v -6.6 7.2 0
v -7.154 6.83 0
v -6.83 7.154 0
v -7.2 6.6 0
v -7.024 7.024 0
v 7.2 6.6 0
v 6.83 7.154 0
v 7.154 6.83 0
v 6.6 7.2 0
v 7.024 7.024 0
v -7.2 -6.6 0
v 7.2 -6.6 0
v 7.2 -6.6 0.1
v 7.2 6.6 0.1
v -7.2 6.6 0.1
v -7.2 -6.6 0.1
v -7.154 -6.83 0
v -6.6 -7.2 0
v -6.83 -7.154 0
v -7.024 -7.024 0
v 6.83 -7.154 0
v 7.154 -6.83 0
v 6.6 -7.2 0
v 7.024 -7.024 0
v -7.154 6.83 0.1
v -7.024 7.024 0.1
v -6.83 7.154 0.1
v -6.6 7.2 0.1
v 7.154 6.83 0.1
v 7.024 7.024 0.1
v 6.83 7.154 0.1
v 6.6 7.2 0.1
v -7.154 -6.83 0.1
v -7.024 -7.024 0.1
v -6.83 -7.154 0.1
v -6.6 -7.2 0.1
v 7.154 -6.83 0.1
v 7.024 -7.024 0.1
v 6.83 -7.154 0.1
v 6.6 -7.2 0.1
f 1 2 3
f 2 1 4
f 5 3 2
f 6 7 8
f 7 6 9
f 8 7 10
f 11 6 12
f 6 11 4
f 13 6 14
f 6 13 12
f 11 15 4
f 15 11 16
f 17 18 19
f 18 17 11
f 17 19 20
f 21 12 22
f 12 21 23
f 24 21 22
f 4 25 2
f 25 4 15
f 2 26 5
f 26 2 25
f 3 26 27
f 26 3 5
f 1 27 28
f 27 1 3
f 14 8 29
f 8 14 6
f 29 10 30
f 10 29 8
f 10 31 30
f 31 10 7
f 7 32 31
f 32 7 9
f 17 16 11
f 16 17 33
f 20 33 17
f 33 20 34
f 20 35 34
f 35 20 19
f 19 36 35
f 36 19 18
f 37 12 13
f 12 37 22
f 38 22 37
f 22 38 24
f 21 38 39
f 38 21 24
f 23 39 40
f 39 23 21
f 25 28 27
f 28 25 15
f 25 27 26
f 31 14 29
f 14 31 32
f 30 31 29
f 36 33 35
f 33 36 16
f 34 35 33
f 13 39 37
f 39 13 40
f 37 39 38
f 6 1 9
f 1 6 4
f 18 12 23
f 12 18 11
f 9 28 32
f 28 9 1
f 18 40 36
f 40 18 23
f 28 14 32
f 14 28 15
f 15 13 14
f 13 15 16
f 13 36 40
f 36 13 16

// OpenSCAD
// file: ../p/4-4edge.scad
use <../lib.scad>
$fa=1; $fs=0.2;
function ldraw_lib__4_4edge(realsolid=false) = [
// 0 Circle 1.0
// 0 Name: 4-4edge.dat
// 0 Author: James Jessiman
// 0 !LDRAW_ORG Primitive UPDATE 2017-01
// 0 !LICENSE Licensed under CC BY 2.0 and CC BY 4.0 : see CAreadme.txt
// 
// 0 BFC CERTIFY CCW
  [0,"BFC","CERTIFY"],
  [0,"BFC","CCW"],
// 
// 0 !HISTORY 1998-12-15 [PTadmin] Official Update 1998-10
// 0 !HISTORY 2005-12-28 [PTadmin] Official Update 2005-01
// 0 !HISTORY 2007-06-24 [PTadmin] Header formatted for Contributor Agreement
// 0 !HISTORY 2008-07-01 [PTadmin] Official Update 2008-01
// 0 !HISTORY 2017-01-15 [Steffen] BFCed
// 0 !HISTORY 2017-12-30 [PTadmin] Official Update 2017-01
// 
// 
// 2 24 1 0 0 0.9239 0 0.3827
  [2,24,1,0,0,0.9239,0,0.3827],
// 2 24 0.9239 0 0.3827 0.7071 0 0.7071
  [2,24,0.9239,0,0.3827,0.7071,0,0.7071],
// 2 24 0.7071 0 0.7071 0.3827 0 0.9239
  [2,24,0.7071,0,0.7071,0.3827,0,0.9239],
// 2 24 0.3827 0 0.9239 0 0 1
  [2,24,0.3827,0,0.9239,0,0,1],
// 2 24 0 0 1 -0.3827 0 0.9239
  [2,24,0,0,1,-0.3827,0,0.9239],
// 2 24 -0.3827 0 0.9239 -0.7071 0 0.7071
  [2,24,-0.3827,0,0.9239,-0.7071,0,0.7071],
// 2 24 -0.7071 0 0.7071 -0.9239 0 0.3827
  [2,24,-0.7071,0,0.7071,-0.9239,0,0.3827],
// 2 24 -0.9239 0 0.3827 -1 0 -0
  [2,24,-0.9239,0,0.3827,-1,0,-0],
// 2 24 -1 0 -0 -0.9239 0 -0.3827
  [2,24,-1,0,-0,-0.9239,0,-0.3827],
// 2 24 -0.9239 0 -0.3827 -0.7071 0 -0.7071
  [2,24,-0.9239,0,-0.3827,-0.7071,0,-0.7071],
// 2 24 -0.7071 0 -0.7071 -0.3827 0 -0.9239
  [2,24,-0.7071,0,-0.7071,-0.3827,0,-0.9239],
// 2 24 -0.3827 0 -0.9239 0 0 -1
  [2,24,-0.3827,0,-0.9239,0,0,-1],
// 2 24 0 0 -1 0.3827 0 -0.9239
  [2,24,0,0,-1,0.3827,0,-0.9239],
// 2 24 0.3827 0 -0.9239 0.7071 0 -0.7071
  [2,24,0.3827,0,-0.9239,0.7071,0,-0.7071],
// 2 24 0.7071 0 -0.7071 0.9239 0 -0.3827
  [2,24,0.7071,0,-0.7071,0.9239,0,-0.3827],
// 2 24 0.9239 0 -0.3827 1 0 0
  [2,24,0.9239,0,-0.3827,1,0,0],
];
module ldraw_lib__4_4edge(step=0, col=false, unit=2/5, alt=false, line=0.2, solid=!$preview)
    makepoly(ldraw_lib__4_4edge(solid), step=step, col=col, unit=unit, alt=alt, line=line, solid=solid);
ldraw_lib__4_4edge(line=0.2);
// file: ../p/4-4disc.scad
use <../lib.scad>
$fa=1; $fs=0.2;
function ldraw_lib__4_4disc(realsolid=false) = [
// 0 Disc 1.0
// 0 Name: 4-4disc.dat
// 0 Author: James Jessiman
// 0 !LDRAW_ORG Primitive UPDATE 2002-02
// 0 !LICENSE Licensed under CC BY 2.0 and CC BY 4.0 : see CAreadme.txt
// 
// 0 BFC CERTIFY CCW
  [0,"BFC","CERTIFY"],
  [0,"BFC","CCW"],
// 
// 0 !HISTORY 1998-12-15 [PTadmin] Official Update 1998-10
// 0 !HISTORY 2002-03-23 [sbliss] Added BFC statement
// 0 !HISTORY 2002-04-25 [PTadmin] Official Update 2002-02
// 0 !HISTORY 2007-06-24 [PTadmin] Header formatted for Contributor Agreement
// 0 !HISTORY 2008-07-01 [PTadmin] Official Update 2008-01
// 
// 
// 3 16 0 0 0 1 0 0 0.9239 0 0.3827
  [3,16,0,0,0,1,0,0,0.9239,0,0.3827],
// 3 16 0 0 0 0.9239 0 0.3827 0.7071 0 0.7071
  [3,16,0,0,0,0.9239,0,0.3827,0.7071,0,0.7071],
// 3 16 0 0 0 0.7071 0 0.7071 0.3827 0 0.9239
  [3,16,0,0,0,0.7071,0,0.7071,0.3827,0,0.9239],
// 3 16 0 0 0 0.3827 0 0.9239 0 0 1
  [3,16,0,0,0,0.3827,0,0.9239,0,0,1],
// 3 16 0 0 0 0 0 1 -0.3827 0 0.9239
  [3,16,0,0,0,0,0,1,-0.3827,0,0.9239],
// 3 16 0 0 0 -0.3827 0 0.9239 -0.7071 0 0.7071
  [3,16,0,0,0,-0.3827,0,0.9239,-0.7071,0,0.7071],
// 3 16 0 0 0 -0.7071 0 0.7071 -0.9239 0 0.3827
  [3,16,0,0,0,-0.7071,0,0.7071,-0.9239,0,0.3827],
// 3 16 0 0 0 -0.9239 0 0.3827 -1 0 -0
  [3,16,0,0,0,-0.9239,0,0.3827,-1,0,-0],
// 3 16 0 0 0 -1 0 -0 -0.9239 0 -0.3827
  [3,16,0,0,0,-1,0,-0,-0.9239,0,-0.3827],
// 3 16 0 0 0 -0.9239 0 -0.3827 -0.7071 0 -0.7071
  [3,16,0,0,0,-0.9239,0,-0.3827,-0.7071,0,-0.7071],
// 3 16 0 0 0 -0.7071 0 -0.7071 -0.3827 0 -0.9239
  [3,16,0,0,0,-0.7071,0,-0.7071,-0.3827,0,-0.9239],
// 3 16 0 0 0 -0.3827 0 -0.9239 0 0 -1
  [3,16,0,0,0,-0.3827,0,-0.9239,0,0,-1],
// 3 16 0 0 0 0 0 -1 0.3827 0 -0.9239
  [3,16,0,0,0,0,0,-1,0.3827,0,-0.9239],
// 3 16 0 0 0 0.3827 0 -0.9239 0.7071 0 -0.7071
  [3,16,0,0,0,0.3827,0,-0.9239,0.7071,0,-0.7071],
// 3 16 0 0 0 0.7071 0 -0.7071 0.9239 0 -0.3827
  [3,16,0,0,0,0.7071,0,-0.7071,0.9239,0,-0.3827],
// 3 16 0 0 0 0.9239 0 -0.3827 1 0 0
  [3,16,0,0,0,0.9239,0,-0.3827,1,0,0],
// 0
];
module ldraw_lib__4_4disc(step=0, col=false, unit=2/5, alt=false, line=0.2, solid=!$preview)
    makepoly(ldraw_lib__4_4disc(solid), step=step, col=col, unit=unit, alt=alt, line=line, solid=solid);
ldraw_lib__4_4disc(line=0.2);
// file: ../p/4-4cyli.scad
use <../lib.scad>
$fa=1; $fs=0.2;
function ldraw_lib__4_4cyli(realsolid=false) = [
// 0 Cylinder 1.0
// 0 Name: 4-4cyli.dat
// 0 Author: James Jessiman
// 0 !LDRAW_ORG Primitive UPDATE 2005-01
// 0 !LICENSE Licensed under CC BY 2.0 and CC BY 4.0 : see CAreadme.txt
// 
// 0 BFC CERTIFY CCW
  [0,"BFC","CERTIFY"],
  [0,"BFC","CCW"],
// 
// 0 !HISTORY 1998-12-15 [PTadmin] Official Update 1998-10
// 0 !HISTORY 2002-03-23 [sbliss] Added BFC statement; merged headers from files in distributions LDraw 0.27 and Complete.
// 0 !HISTORY 2002-04-25 [PTadmin] Official Update 2002-02
// 0 !HISTORY 2004-12-14 [guyvivan] BFC CCW
// 0 !HISTORY 2005-12-28 [PTadmin] Official Update 2005-01
// 0 !HISTORY 2007-06-24 [PTadmin] Header formatted for Contributor Agreement
// 0 !HISTORY 2008-07-01 [PTadmin] Official Update 2008-01
// 
// 
// 4 16 1 1 0 0.9239 1 0.3827 0.9239 0 0.3827 1 0 0
  [4,16,1,1,0,0.9239,1,0.3827,0.9239,0,0.3827,1,0,0],
// 5 24 1 0 0 1 1 0 0.9239 0 0.3827 0.9239 0 -0.3827
  [5,24,1,0,0,1,1,0,0.9239,0,0.3827,0.9239,0,-0.3827],
// 4 16 0.9239 1 0.3827 0.7071 1 0.7071 0.7071 0 0.7071 0.9239 0 0.3827
  [4,16,0.9239,1,0.3827,0.7071,1,0.7071,0.7071,0,0.7071,0.9239,0,0.3827],
// 5 24 0.9239 0 0.3827 0.9239 1 0.3827 0.7071 0 0.7071 1 0 0
  [5,24,0.9239,0,0.3827,0.9239,1,0.3827,0.7071,0,0.7071,1,0,0],
// 4 16 0.7071 1 0.7071 0.3827 1 0.9239 0.3827 0 0.9239 0.7071 0 0.7071
  [4,16,0.7071,1,0.7071,0.3827,1,0.9239,0.3827,0,0.9239,0.7071,0,0.7071],
// 5 24 0.7071 0 0.7071 0.7071 1 0.7071 0.3827 0 0.9239 0.9239 0 0.3827
  [5,24,0.7071,0,0.7071,0.7071,1,0.7071,0.3827,0,0.9239,0.9239,0,0.3827],
// 4 16 0.3827 1 0.9239 0 1 1 0 0 1 0.3827 0 0.9239
  [4,16,0.3827,1,0.9239,0,1,1,0,0,1,0.3827,0,0.9239],
// 5 24 0.3827 0 0.9239 0.3827 1 0.9239 0 0 1 0.7071 0 0.7071
  [5,24,0.3827,0,0.9239,0.3827,1,0.9239,0,0,1,0.7071,0,0.7071],
// 4 16 0 1 1 -0.3827 1 0.9239 -0.3827 0 0.9239 0 0 1
  [4,16,0,1,1,-0.3827,1,0.9239,-0.3827,0,0.9239,0,0,1],
// 5 24 0 0 1 0 1 1 -0.3827 0 0.9239 0.3827 0 0.9239
  [5,24,0,0,1,0,1,1,-0.3827,0,0.9239,0.3827,0,0.9239],
// 4 16 -0.3827 1 0.9239 -0.7071 1 0.7071 -0.7071 0 0.7071 -0.3827 0 0.9239
  [4,16,-0.3827,1,0.9239,-0.7071,1,0.7071,-0.7071,0,0.7071,-0.3827,0,0.9239],
// 5 24 -0.3827 0 0.9239 -0.3827 1 0.9239 -0.7071 0 0.7071 0 0 1
  [5,24,-0.3827,0,0.9239,-0.3827,1,0.9239,-0.7071,0,0.7071,0,0,1],
// 4 16 -0.7071 1 0.7071 -0.9239 1 0.3827 -0.9239 0 0.3827 -0.7071 0 0.7071
  [4,16,-0.7071,1,0.7071,-0.9239,1,0.3827,-0.9239,0,0.3827,-0.7071,0,0.7071],
// 5 24 -0.7071 0 0.7071 -0.7071 1 0.7071 -0.9239 0 0.3827 -0.3827 0 0.9239
  [5,24,-0.7071,0,0.7071,-0.7071,1,0.7071,-0.9239,0,0.3827,-0.3827,0,0.9239],
// 4 16 -0.9239 1 0.3827 -1 1 0 -1 0 0 -0.9239 0 0.3827
  [4,16,-0.9239,1,0.3827,-1,1,0,-1,0,0,-0.9239,0,0.3827],
// 5 24 -0.9239 0 0.3827 -0.9239 1 0.3827 -1 0 0 -0.7071 0 0.7071
  [5,24,-0.9239,0,0.3827,-0.9239,1,0.3827,-1,0,0,-0.7071,0,0.7071],
// 4 16 -1 1 0 -0.9239 1 -0.3827 -0.9239 0 -0.3827 -1 0 0
  [4,16,-1,1,0,-0.9239,1,-0.3827,-0.9239,0,-0.3827,-1,0,0],
// 5 24 -1 0 0 -1 1 0 -0.9239 0 -0.3827 -0.9239 0 0.3827
  [5,24,-1,0,0,-1,1,0,-0.9239,0,-0.3827,-0.9239,0,0.3827],
// 4 16 -0.9239 1 -0.3827 -0.7071 1 -0.7071 -0.7071 0 -0.7071 -0.9239 0 -0.3827
  [4,16,-0.9239,1,-0.3827,-0.7071,1,-0.7071,-0.7071,0,-0.7071,-0.9239,0,-0.3827],
// 5 24 -0.9239 0 -0.3827 -0.9239 1 -0.3827 -0.7071 0 -0.7071 -1 0 0
  [5,24,-0.9239,0,-0.3827,-0.9239,1,-0.3827,-0.7071,0,-0.7071,-1,0,0],
// 4 16 -0.7071 1 -0.7071 -0.3827 1 -0.9239 -0.3827 0 -0.9239 -0.7071 0 -0.7071
  [4,16,-0.7071,1,-0.7071,-0.3827,1,-0.9239,-0.3827,0,-0.9239,-0.7071,0,-0.7071],
// 5 24 -0.7071 0 -0.7071 -0.7071 1 -0.7071 -0.3827 0 -0.9239 -0.9239 0 -0.3827
  [5,24,-0.7071,0,-0.7071,-0.7071,1,-0.7071,-0.3827,0,-0.9239,-0.9239,0,-0.3827],
// 4 16 -0.3827 1 -0.9239 0 1 -1 0 0 -1 -0.3827 0 -0.9239
  [4,16,-0.3827,1,-0.9239,0,1,-1,0,0,-1,-0.3827,0,-0.9239],
// 5 24 -0.3827 0 -0.9239 -0.3827 1 -0.9239 0 0 -1 -0.7071 0 -0.7071
  [5,24,-0.3827,0,-0.9239,-0.3827,1,-0.9239,0,0,-1,-0.7071,0,-0.7071],
// 4 16 0 1 -1 0.3827 1 -0.9239 0.3827 0 -0.9239 0 0 -1
  [4,16,0,1,-1,0.3827,1,-0.9239,0.3827,0,-0.9239,0,0,-1],
// 5 24 0 0 -1 0 1 -1 0.3827 0 -0.9239 -0.3827 0 -0.9239
  [5,24,0,0,-1,0,1,-1,0.3827,0,-0.9239,-0.3827,0,-0.9239],
// 4 16 0.3827 1 -0.9239 0.7071 1 -0.7071 0.7071 0 -0.7071 0.3827 0 -0.9239
  [4,16,0.3827,1,-0.9239,0.7071,1,-0.7071,0.7071,0,-0.7071,0.3827,0,-0.9239],
// 5 24 0.3827 0 -0.9239 0.3827 1 -0.9239 0.7071 0 -0.7071 0 0 -1
  [5,24,0.3827,0,-0.9239,0.3827,1,-0.9239,0.7071,0,-0.7071,0,0,-1],
// 4 16 0.7071 1 -0.7071 0.9239 1 -0.3827 0.9239 0 -0.3827 0.7071 0 -0.7071
  [4,16,0.7071,1,-0.7071,0.9239,1,-0.3827,0.9239,0,-0.3827,0.7071,0,-0.7071],
// 5 24 0.7071 0 -0.7071 0.7071 1 -0.7071 0.9239 0 -0.3827 0.3827 0 -0.9239
  [5,24,0.7071,0,-0.7071,0.7071,1,-0.7071,0.9239,0,-0.3827,0.3827,0,-0.9239],
// 4 16 0.9239 1 -0.3827 1 1 0 1 0 0 0.9239 0 -0.3827
  [4,16,0.9239,1,-0.3827,1,1,0,1,0,0,0.9239,0,-0.3827],
// 5 24 0.9239 0 -0.3827 0.9239 1 -0.3827 1 0 0 0.7071 0 -0.7071
  [5,24,0.9239,0,-0.3827,0.9239,1,-0.3827,1,0,0,0.7071,0,-0.7071],
// 0
];
module ldraw_lib__4_4cyli(step=0, col=false, unit=2/5, alt=false, line=0.2, solid=!$preview)
    makepoly(ldraw_lib__4_4cyli(solid), step=step, col=col, unit=unit, alt=alt, line=line, solid=solid);
ldraw_lib__4_4cyli(line=0.2);
// file: ../p/stud3.scad
use <../lib.scad>
use <4-4cyli.scad>
use <4-4disc.scad>
use <4-4edge.scad>
$fa=1; $fs=0.2;
function ldraw_lib__stud3(realsolid=false) = realsolid ? 
    [openscad(translate([0,0,-eps()], o=cylinder(4+eps(), r=4)),2)] : [
// 0 Stud Tube Solid
// 0 Name: stud3.dat
// 0 Author: James Jessiman
// 0 !LDRAW_ORG Primitive UPDATE 2012-01
// 0 !LICENSE Licensed under CC BY 2.0 and CC BY 4.0 : see CAreadme.txt
// 
// 0 BFC CERTIFY CCW
  [0,"BFC","CERTIFY"],
  [0,"BFC","CCW"],
// 
// 0 !HISTORY 2002-04-04 [sbliss] Modified for BFC compliance
// 0 !HISTORY 2002-04-25 [PTadmin] Official Update 2002-02
// 0 !HISTORY 2007-06-24 [PTadmin] Header formatted for Contributor Agreement
// 0 !HISTORY 2008-07-01 [PTadmin] Official Update 2008-01
// 0 !HISTORY 2012-02-16 [Philo] Changed to CCW
// 0 !HISTORY 2012-03-30 [PTadmin] Official Update 2012-01
// 
// 
// 1 16 0 -4 0 4 0 0 0 1 0 0 0 4 4-4edge.dat
  [1,16,0,-4,0,4,0,0,0,1,0,0,0,4, ldraw_lib__4_4edge(realsolid)],
// 1 16 0 0 0 4 0 0 0 1 0 0 0 4 4-4edge.dat
  [1,16,0,0,0,4,0,0,0,1,0,0,0,4, ldraw_lib__4_4edge(realsolid)],
// 1 16 0 -4 0 4 0 0 0 1 0 0 0 4 4-4disc.dat
  [1,16,0,-4,0,4,0,0,0,1,0,0,0,4, ldraw_lib__4_4disc(realsolid)],
// 1 16 0 -4 0 4 0 0 0 4 0 0 0 4 4-4cyli.dat
  [1,16,0,-4,0,4,0,0,0,4,0,0,0,4, ldraw_lib__4_4cyli(realsolid)],
];
module ldraw_lib__stud3(step=0, col=false, unit=2/5, alt=false, line=0.2, solid=!$preview)
    makepoly(ldraw_lib__stud3(solid), step=step, col=col, unit=unit, alt=alt, line=line, solid=solid);
ldraw_lib__stud3(line=0.2);
// file: ../p/stud.scad
use <../lib.scad>
use <4-4cyli.scad>
use <4-4disc.scad>
use <4-4edge.scad>
$fa=1; $fs=0.2;
function ldraw_lib__stud(realsolid=false) = realsolid ? 
    [openscad(translate([0,0,-eps()], o=cylinder(4+eps(), r=6)),2)] : [
// 0 Stud
// 0 Name: stud.dat
// 0 Author: James Jessiman
// 0 !LDRAW_ORG Primitive UPDATE 2012-01
// 0 !LICENSE Licensed under CC BY 2.0 and CC BY 4.0 : see CAreadme.txt
// 
// 0 BFC CERTIFY CCW
  [0,"BFC","CERTIFY"],
  [0,"BFC","CCW"],
// 
// 0 !HISTORY 2002-04-04 [sbliss] Modified for BFC compliance
// 0 !HISTORY 2002-04-25 [PTadmin] Official Update 2002-02
// 0 !HISTORY 2007-06-24 [PTadmin] Header formatted for Contributor Agreement
// 0 !HISTORY 2008-07-01 [PTadmin] Official Update 2008-01
// 0 !HISTORY 2012-02-16 [Philo] Changed to CCW
// 0 !HISTORY 2012-03-30 [PTadmin] Official Update 2012-01
// 
// 
// 1 16 0 0 0 6 0 0 0 1 0 0 0 6 4-4edge.dat
  [1,16,0,0,0,6,0,0,0,1,0,0,0,6, ldraw_lib__4_4edge(realsolid)],
// 1 16 0 -4 0 6 0 0 0 1 0 0 0 6 4-4edge.dat
  [1,16,0,-4,0,6,0,0,0,1,0,0,0,6, ldraw_lib__4_4edge(realsolid)],
// 1 16 0 0 0 6 0 0 0 -4 0 0 0 6 4-4cyli.dat
  [1,16,0,0,0,6,0,0,0,-4,0,0,0,6, ldraw_lib__4_4cyli(realsolid)],
// 1 16 0 -4 0 6 0 0 0 1 0 0 0 6 4-4disc.dat
  [1,16,0,-4,0,6,0,0,0,1,0,0,0,6, ldraw_lib__4_4disc(realsolid)],
];
module ldraw_lib__stud(step=0, col=false, unit=2/5, alt=false, line=0.2, solid=!$preview)
    makepoly(ldraw_lib__stud(solid), step=step, col=col, unit=unit, alt=alt, line=line, solid=solid);
ldraw_lib__stud(line=0.2);
// file: ../p/box5.scad
use <../lib.scad>
$fa=1; $fs=0.2;
function ldraw_lib__box5(realsolid=false) = [
// 0 Box with 5 Faces and All Edges
// 0 Name: box5.dat
// 0 Author: James Jessiman
// 0 !LDRAW_ORG Primitive UPDATE 2012-01
// 0 !LICENSE Licensed under CC BY 2.0 and CC BY 4.0 : see CAreadme.txt
// 
// 0 BFC CERTIFY CCW
  [0,"BFC","CERTIFY"],
  [0,"BFC","CCW"],
// 
// 0 !HISTORY 2002-04-03 [sbliss] Modified for BFC compliance
// 0 !HISTORY 2002-04-25 [PTadmin] Official Update 2002-02
// 0 !HISTORY 2007-06-24 [PTadmin] Header formatted for Contributor Agreement
// 0 !HISTORY 2008-07-01 [PTadmin] Official Update 2008-01
// 0 !HISTORY 2012-02-16 [Philo] Changed to CCW
// 0 !HISTORY 2012-03-30 [PTadmin] Official Update 2012-01
// 
// 
// 2 24 1 1 1 -1 1 1
  [2,24,1,1,1,-1,1,1],
// 2 24 -1 1 1 -1 1 -1
  [2,24,-1,1,1,-1,1,-1],
// 2 24 -1 1 -1 1 1 -1
  [2,24,-1,1,-1,1,1,-1],
// 2 24 1 1 -1 1 1 1
  [2,24,1,1,-1,1,1,1],
// 2 24 1 0 1 -1 0 1
  [2,24,1,0,1,-1,0,1],
// 2 24 -1 0 1 -1 0 -1
  [2,24,-1,0,1,-1,0,-1],
// 2 24 -1 0 -1 1 0 -1
  [2,24,-1,0,-1,1,0,-1],
// 2 24 1 0 -1 1 0 1
  [2,24,1,0,-1,1,0,1],
// 2 24 1 0 1 1 1 1
  [2,24,1,0,1,1,1,1],
// 2 24 -1 0 1 -1 1 1
  [2,24,-1,0,1,-1,1,1],
// 2 24 1 0 -1 1 1 -1
  [2,24,1,0,-1,1,1,-1],
// 2 24 -1 0 -1 -1 1 -1
  [2,24,-1,0,-1,-1,1,-1],
// 4 16 -1 1 1 1 1 1 1 1 -1 -1 1 -1
  [4,16,-1,1,1,1,1,1,1,1,-1,-1,1,-1],
// 4 16 -1 1 1 -1 0 1 1 0 1 1 1 1
  [4,16,-1,1,1,-1,0,1,1,0,1,1,1,1],
// 4 16 -1 1 -1 -1 0 -1 -1 0 1 -1 1 1
  [4,16,-1,1,-1,-1,0,-1,-1,0,1,-1,1,1],
// 4 16 1 1 -1 1 0 -1 -1 0 -1 -1 1 -1
  [4,16,1,1,-1,1,0,-1,-1,0,-1,-1,1,-1],
// 4 16 1 1 1 1 0 1 1 0 -1 1 1 -1
  [4,16,1,1,1,1,0,1,1,0,-1,1,1,-1],
];
module ldraw_lib__box5(step=0, col=false, unit=2/5, alt=false, line=0.2, solid=!$preview)
    makepoly(ldraw_lib__box5(solid), step=step, col=col, unit=unit, alt=alt, line=line, solid=solid);
ldraw_lib__box5(line=0.2);
// file: ../p/box4t.scad
use <../lib.scad>
$fa=1; $fs=0.2;
function ldraw_lib__box4t(realsolid=false) = [
// 0 Box with 4 Adjacent Faces and All Edges
// 0 Name: box4t.dat
// 0 Author: Tore Eriksson [Tore_Eriksson]
// 0 !LDRAW_ORG Primitive UPDATE 2003-02
// 0 !LICENSE Licensed under CC BY 2.0 and CC BY 4.0 : see CAreadme.txt
// 
// 0 BFC CERTIFY CCW
  [0,"BFC","CERTIFY"],
  [0,"BFC","CCW"],
// 
// 0 !HISTORY 1997-09-29 [PTadmin] Official Update 1997-15
// 0 !HISTORY 2002-08-31 [izanette] Modified with WINDZ for BFC compliance
// 0 !HISTORY 2003-08-01 [PTadmin] Official Update 2003-02
// 0 !HISTORY 2007-06-24 [PTadmin] Header formatted for Contributor Agreement
// 0 !HISTORY 2008-07-01 [PTadmin] Official Update 2008-01
// 
// 
// 2 24 1 1 1 -1 1 1
  [2,24,1,1,1,-1,1,1],
// 2 24 -1 1 1 -1 1 -1
  [2,24,-1,1,1,-1,1,-1],
// 2 24 -1 1 -1 1 1 -1
  [2,24,-1,1,-1,1,1,-1],
// 2 24 1 1 -1 1 1 1
  [2,24,1,1,-1,1,1,1],
// 2 24 1 0 1 -1 0 1
  [2,24,1,0,1,-1,0,1],
// 2 24 -1 0 1 -1 0 -1
  [2,24,-1,0,1,-1,0,-1],
// 2 24 -1 0 -1 1 0 -1
  [2,24,-1,0,-1,1,0,-1],
// 2 24 1 0 -1 1 0 1
  [2,24,1,0,-1,1,0,1],
// 2 24 1 0 1 1 1 1
  [2,24,1,0,1,1,1,1],
// 2 24 -1 0 1 -1 1 1
  [2,24,-1,0,1,-1,1,1],
// 2 24 1 0 -1 1 1 -1
  [2,24,1,0,-1,1,1,-1],
// 2 24 -1 0 -1 -1 1 -1
  [2,24,-1,0,-1,-1,1,-1],
// 4 16 1 1 1 1 1 -1 -1 1 -1 -1 1 1
  [4,16,1,1,1,1,1,-1,-1,1,-1,-1,1,1],
// 4 16 1 1 1 -1 1 1 -1 0 1 1 0 1
  [4,16,1,1,1,-1,1,1,-1,0,1,1,0,1],
// 4 16 -1 1 1 -1 1 -1 -1 0 -1 -1 0 1
  [4,16,-1,1,1,-1,1,-1,-1,0,-1,-1,0,1],
// 0 4 16 -1 1 -1 -1 0 -1 1 0 -1 1 1 -1
// 4 16 1 1 -1 1 1 1 1 0 1 1 0 -1
  [4,16,1,1,-1,1,1,1,1,0,1,1,0,-1],
// 0
];
module ldraw_lib__box4t(step=0, col=false, unit=2/5, alt=false, line=0.2, solid=!$preview)
    makepoly(ldraw_lib__box4t(solid), step=step, col=col, unit=unit, alt=alt, line=line, solid=solid);
ldraw_lib__box4t(line=0.2);
// file: s/3004s01.scad
use <../../lib.scad>
use <../../p/box4t.scad>
use <../../p/box5.scad>
use <../../p/stud.scad>
use <../../p/stud3.scad>
$fa=1; $fs=0.2;
function ldraw_lib__s__3004s01(realsolid=false) = [
// 0 ~Brick  1 x  2 without Front Face
// 0 Name: s\3004s01.dat
// 0 Author: James Jessiman
// 0 !LDRAW_ORG Subpart UPDATE 2003-03
// 0 !LICENSE Licensed under CC BY 2.0 and CC BY 4.0 : see CAreadme.txt
// 
// 0 BFC CERTIFY CCW
  [0,"BFC","CERTIFY"],
  [0,"BFC","CCW"],
// 
// 0 !HISTORY 2003-09-07 [jriley] Subfiling, BFC
// 0 !HISTORY 2003-12-19 [PTadmin] Official Update 2003-03
// 0 !HISTORY 2007-08-29 [PTadmin] Header formatted for Contributor Agreement
// 0 !HISTORY 2008-07-01 [PTadmin] Official Update 2008-01
// 
// 
// 1 16 0 4 0 1 0 0 0 -5 0 0 0 1 stud3.dat
  [1,16,0,4,0,1,0,0,0,-5,0,0,0,1, ldraw_lib__stud3(realsolid)],
// 0 BFC INVERTNEXT
  [0,"BFC","INVERTNEXT"],
// 1 16 0 24 0 16 0 0 0 -20 0 0 0 6 box5.dat
  [1,16,0,24,0,16,0,0,0,-20,0,0,0,6, ldraw_lib__box5(realsolid)],
// 4 16 20 24 10 16 24 6 -16 24 6 -20 24 10
  [4,16,20,24,10,16,24,6,-16,24,6,-20,24,10],
// 4 16 -20 24 10 -16 24 6 -16 24 -6 -20 24 -10
  [4,16,-20,24,10,-16,24,6,-16,24,-6,-20,24,-10],
// 4 16 -20 24 -10 -16 24 -6 16 24 -6 20 24 -10
  [4,16,-20,24,-10,-16,24,-6,16,24,-6,20,24,-10],
// 4 16 20 24 -10 16 24 -6 16 24 6 20 24 10
  [4,16,20,24,-10,16,24,-6,16,24,6,20,24,10],
// 1 16 0 24 0 20 0 0 0 -24 0 0 0 10 box4t.dat
  [1,16,0,24,0,20,0,0,0,-24,0,0,0,10, ldraw_lib__box4t(realsolid)],
// 1 16 10 0 0 1 0 0 0 1 0 0 0 1 stud.dat
  [1,16,10,0,0,1,0,0,0,1,0,0,0,1, ldraw_lib__stud(realsolid)],
// 1 16 -10 0 0 1 0 0 0 1 0 0 0 1 stud.dat
  [1,16,-10,0,0,1,0,0,0,1,0,0,0,1, ldraw_lib__stud(realsolid)],
// 0
];
module ldraw_lib__s__3004s01(step=0, col=false, unit=2/5, alt=false, line=0.2, solid=!$preview)
    makepoly(ldraw_lib__s__3004s01(solid), step=step, col=col, unit=unit, alt=alt, line=line, solid=solid);
ldraw_lib__s__3004s01(line=0.2);
// file: 3004.scad
use <../lib.scad>
use <s/3004s01.scad>
$fa=1; $fs=0.2;
function ldraw_lib__3004(realsolid=false) = [
// 0 Brick  1 x  2
// 0 Name: 3004.dat
// 0 Author: James Jessiman
// 0 !LDRAW_ORG Part UPDATE 2022-05
// 0 !LICENSE Licensed under CC BY 2.0 and CC BY 4.0 : see CAreadme.txt
// 
// 0 BFC CERTIFY CCW
  [0,"BFC","CERTIFY"],
  [0,"BFC","CCW"],
// 
// 0 !HISTORY 2001-10-26 [PTadmin] Official Update 2001-01
// 0 !HISTORY 2002-05-07 {unknown} BFC Certification
// 0 !HISTORY 2002-06-11 [PTadmin] Official Update 2002-03
// 0 !HISTORY 2007-05-07 [PTadmin] Header formatted for Contributor Agreement
// 0 !HISTORY 2008-07-01 [PTadmin] Official Update 2008-01
// 0 !HISTORY 2022-08-04 [MagFors] Using subfile
// 0 !HISTORY 2022-09-15 [PTadmin] Official Update 2022-05
// 
// 
// 1 16 0 0 0 1 0 0 0 1 0 0 0 1 s\3004s01.dat
  [1,16,0,0,0,1,0,0,0,1,0,0,0,1, ldraw_lib__s__3004s01(realsolid)],
// 4 16 -20 24 -10 20 24 -10 20 0 -10 -20 0 -10
  [4,16,-20,24,-10,20,24,-10,20,0,-10,-20,0,-10],
];
module ldraw_lib__3004(step=0, col=false, unit=2/5, alt=false, line=0.2, solid=!$preview)
    makepoly(ldraw_lib__3004(solid), step=step, col=col, unit=unit, alt=alt, line=line, solid=solid);
ldraw_lib__3004(line=0.2);
// file: ../p/box3u12.scad
use <../lib.scad>
$fa=1; $fs=0.2;
function ldraw_lib__box3u12(realsolid=false) = [
// 0 Box with 3 Parallel Faces without Any Edges
// 0 Name: box3u12.dat
// 0 Author: J.C. Tchang [tchang]
// 0 !LDRAW_ORG Primitive UPDATE 2014-02
// 0 !LICENSE Licensed under CC BY 2.0 and CC BY 4.0 : see CAreadme.txt
// 
// 0 BFC CERTIFY CCW
  [0,"BFC","CERTIFY"],
  [0,"BFC","CCW"],
// 
// 0 !HISTORY 2014-12-23 [PTadmin] Official Update 2014-02
// 
// 
// 4 16 -1 1 1 1 1 1 1 1 -1 -1 1 -1
  [4,16,-1,1,1,1,1,1,1,1,-1,-1,1,-1],
// 4 16 -1 1 1 -1 0 1 1 0 1 1 1 1
  [4,16,-1,1,1,-1,0,1,1,0,1,1,1,1],
// 4 16 1 1 -1 1 0 -1 -1 0 -1 -1 1 -1
  [4,16,1,1,-1,1,0,-1,-1,0,-1,-1,1,-1],
];
module ldraw_lib__box3u12(step=0, col=false, unit=2/5, alt=false, line=0.2, solid=!$preview)
    makepoly(ldraw_lib__box3u12(solid), step=step, col=col, unit=unit, alt=alt, line=line, solid=solid);
ldraw_lib__box3u12(line=0.2);
// file: ../p/1-4cyli.scad
use <../lib.scad>
$fa=1; $fs=0.2;
function ldraw_lib__1_4cyli(realsolid=false) = [
// 0 Cylinder 0.25
// 0 Name: 1-4cyli.dat
// 0 Author: James Jessiman
// 0 !LDRAW_ORG Primitive UPDATE 2012-01
// 0 !LICENSE Licensed under CC BY 2.0 and CC BY 4.0 : see CAreadme.txt
// 
// 0 BFC CERTIFY CCW
  [0,"BFC","CERTIFY"],
  [0,"BFC","CCW"],
// 
// 0 !HISTORY 2002-03-23 [sbliss] Added BFC statement.
// 0 !HISTORY 2002-04-25 [PTadmin] Official Update 2002-02
// 0 !HISTORY 2007-06-22 [PTadmin] Header formatted for Contributor Agreement
// 0 !HISTORY 2008-07-01 [PTadmin] Official Update 2008-01
// 0 !HISTORY 2012-02-16 [Philo] Changed to CCW
// 0 !HISTORY 2012-03-30 [PTadmin] Official Update 2012-01
// 
// 
// 4 16 1 1 0 0.9239 1 0.3827 0.9239 0 0.3827 1 0 0
  [4,16,1,1,0,0.9239,1,0.3827,0.9239,0,0.3827,1,0,0],
// 5 24 1 0 0 1 1 0 0.9239 0 0.3827 1 0 -1
  [5,24,1,0,0,1,1,0,0.9239,0,0.3827,1,0,-1],
// 4 16 0.9239 1 0.3827 0.7071 1 0.7071 0.7071 0 0.7071 0.9239 0 0.3827
  [4,16,0.9239,1,0.3827,0.7071,1,0.7071,0.7071,0,0.7071,0.9239,0,0.3827],
// 5 24 0.9239 0 0.3827 0.9239 1 0.3827 0.7071 0 0.7071 1 0 0
  [5,24,0.9239,0,0.3827,0.9239,1,0.3827,0.7071,0,0.7071,1,0,0],
// 4 16 0.7071 1 0.7071 0.3827 1 0.9239 0.3827 0 0.9239 0.7071 0 0.7071
  [4,16,0.7071,1,0.7071,0.3827,1,0.9239,0.3827,0,0.9239,0.7071,0,0.7071],
// 5 24 0.7071 0 0.7071 0.7071 1 0.7071 0.3827 0 0.9239 0.9239 0 0.3827
  [5,24,0.7071,0,0.7071,0.7071,1,0.7071,0.3827,0,0.9239,0.9239,0,0.3827],
// 4 16 0.3827 1 0.9239 0 1 1 0 0 1 0.3827 0 0.9239
  [4,16,0.3827,1,0.9239,0,1,1,0,0,1,0.3827,0,0.9239],
// 5 24 0.3827 0 0.9239 0.3827 1 0.9239 0 0 1 0.7071 0 0.7071
  [5,24,0.3827,0,0.9239,0.3827,1,0.9239,0,0,1,0.7071,0,0.7071],
// 5 24 0 0 1 0 1 1 0.3827 0 0.9239 -1 0 1
  [5,24,0,0,1,0,1,1,0.3827,0,0.9239,-1,0,1],
];
module ldraw_lib__1_4cyli(step=0, col=false, unit=2/5, alt=false, line=0.2, solid=!$preview)
    makepoly(ldraw_lib__1_4cyli(solid), step=step, col=col, unit=unit, alt=alt, line=line, solid=solid);
ldraw_lib__1_4cyli(line=0.2);
// file: ../p/1-4chrd.scad
use <../lib.scad>
$fa=1; $fs=0.2;
function ldraw_lib__1_4chrd(realsolid=false) = [
// 0 Chord 0.25
// 0 Name: 1-4chrd.dat
// 0 Author: Tony Hafner [hafhead]
// 0 !LDRAW_ORG Primitive UPDATE 2012-02
// 0 !LICENSE Licensed under CC BY 2.0 and CC BY 4.0 : see CAreadme.txt
// 
// 0 BFC CERTIFY CCW
  [0,"BFC","CERTIFY"],
  [0,"BFC","CCW"],
// 
// 0 !HISTORY 2004-04-22 [PTadmin] Official Update 2004-02
// 0 !HISTORY 2007-10-09 [PTadmin] Header formatted for Contributor Agreement
// 0 !HISTORY 2008-07-01 [PTadmin] Official Update 2008-01
// 0 !HISTORY 2012-08-02 [MMR1988] Re-creation with PrimGen2 and Rectifier
// 0 !HISTORY 2012-08-09 [PTadmin] Official Update 2012-02
// 
// 
// 4 16 0.9239 0 0.3827 0.3827 0 0.9239 0 0 1 1 0 0
  [4,16,0.9239,0,0.3827,0.3827,0,0.9239,0,0,1,1,0,0],
// 3 16 0.7071 0 0.7071 0.3827 0 0.9239 0.9239 0 0.3827
  [3,16,0.7071,0,0.7071,0.3827,0,0.9239,0.9239,0,0.3827],
];
module ldraw_lib__1_4chrd(step=0, col=false, unit=2/5, alt=false, line=0.2, solid=!$preview)
    makepoly(ldraw_lib__1_4chrd(solid), step=step, col=col, unit=unit, alt=alt, line=line, solid=solid);
ldraw_lib__1_4chrd(line=0.2);
// main file
use <../lib.scad>
use <../p/1-4chrd.scad>
use <../p/1-4cyli.scad>
use <../p/box3u12.scad>
$fa=1; $fs=0.2;
function ldraw_lib__6142622d(realsolid=false) = [
// 0 Sticker  1.8 x  1.8 with Black Background
// 0 Name: 6142622d.dat
// 0 Author: Massimo Maso [Sirio]
// 0 !LDRAW_ORG Part UPDATE 2022-03
// 0 !LICENSE Licensed under CC BY 2.0 and CC BY 4.0 : see CAreadme.txt
// 
// 0 BFC CERTIFY CCW
  [0,"BFC","CERTIFY"],
  [0,"BFC","CCW"],
// 
// 0 !KEYWORDS Chevrolet, Corvette, Set 75870, Speed Champions
// 
// 0 !HISTORY 2022-05-07 [PTadmin] Official Update 2022-03
// 
// 
// 0 // Primitives
// 
// 1 16 -16.5 0 16.5 -1.5 0 0 0 -1 0 0 0 1.5 1-4chrd.dat
  [1,16,-16.5,0,16.5,-1.5,0,0,0,-1,0,0,0,1.5, ldraw_lib__1_4chrd(realsolid)],
// 1 16 16.5 0 16.5 1.5 0 0 0 -1 0 0 0 1.5 1-4chrd.dat
  [1,16,16.5,0,16.5,1.5,0,0,0,-1,0,0,0,1.5, ldraw_lib__1_4chrd(realsolid)],
// 1 16 0 -.25 0 0 0 18 0 .25 0 -16.5 0 0 box3u12.dat
  [1,16,0,-.25,0,0,0,18,0,.25,0,-16.5,0,0, ldraw_lib__box3u12(realsolid)],
// 1 16 -16.5 0 -16.5 -1.5 0 0 0 -1 0 0 0 -1.5 1-4chrd.dat
  [1,16,-16.5,0,-16.5,-1.5,0,0,0,-1,0,0,0,-1.5, ldraw_lib__1_4chrd(realsolid)],
// 1 16 16.5 0 -16.5 1.5 0 0 0 -1 0 0 0 -1.5 1-4chrd.dat
  [1,16,16.5,0,-16.5,1.5,0,0,0,-1,0,0,0,-1.5, ldraw_lib__1_4chrd(realsolid)],
// 1 16 -16.5 0 16.5 -1.5 0 0 0 -.25 0 0 0 1.5 1-4cyli.dat
  [1,16,-16.5,0,16.5,-1.5,0,0,0,-.25,0,0,0,1.5, ldraw_lib__1_4cyli(realsolid)],
// 1 16 16.5 0 16.5 1.5 0 0 0 -.25 0 0 0 1.5 1-4cyli.dat
  [1,16,16.5,0,16.5,1.5,0,0,0,-.25,0,0,0,1.5, ldraw_lib__1_4cyli(realsolid)],
// 1 16 -16.5 0 -16.5 -1.5 0 0 0 -.25 0 0 0 -1.5 1-4cyli.dat
  [1,16,-16.5,0,-16.5,-1.5,0,0,0,-.25,0,0,0,-1.5, ldraw_lib__1_4cyli(realsolid)],
// 1 16 16.5 0 -16.5 1.5 0 0 0 -.25 0 0 0 -1.5 1-4cyli.dat
  [1,16,16.5,0,-16.5,1.5,0,0,0,-.25,0,0,0,-1.5, ldraw_lib__1_4cyli(realsolid)],
// 1 0 -16.5 -.25 16.5 -1.5 0 0 0 1 0 0 0 1.5 1-4chrd.dat
  [1,0,-16.5,-.25,16.5,-1.5,0,0,0,1,0,0,0,1.5, ldraw_lib__1_4chrd(realsolid)],
// 1 0 16.5 -.25 16.5 1.5 0 0 0 1 0 0 0 1.5 1-4chrd.dat
  [1,0,16.5,-.25,16.5,1.5,0,0,0,1,0,0,0,1.5, ldraw_lib__1_4chrd(realsolid)],
// 1 0 -16.5 -.25 -16.5 -1.5 0 0 0 1 0 0 0 -1.5 1-4chrd.dat
  [1,0,-16.5,-.25,-16.5,-1.5,0,0,0,1,0,0,0,-1.5, ldraw_lib__1_4chrd(realsolid)],
// 1 0 16.5 -.25 -16.5 1.5 0 0 0 1 0 0 0 -1.5 1-4chrd.dat
  [1,0,16.5,-.25,-16.5,1.5,0,0,0,1,0,0,0,-1.5, ldraw_lib__1_4chrd(realsolid)],
// 0 // Bottom faces
// 4 16 16.5 0 18 18 0 16.5 -18 0 16.5 -16.5 0 18
  [4,16,16.5,0,18,18,0,16.5,-18,0,16.5,-16.5,0,18],
// 4 16 16.5 0 -18 -16.5 0 -18 -18 0 -16.5 18 0 -16.5
  [4,16,16.5,0,-18,-16.5,0,-18,-18,0,-16.5,18,0,-16.5],
// 0 // Lateral faces
// 4 16 -16.5 0 18 -16.5 -.25 18 16.5 -.25 18 16.5 0 18
  [4,16,-16.5,0,18,-16.5,-.25,18,16.5,-.25,18,16.5,0,18],
// 4 16 -16.5 0 -18 16.5 0 -18 16.5 -.25 -18 -16.5 -.25 -18
  [4,16,-16.5,0,-18,16.5,0,-18,16.5,-.25,-18,-16.5,-.25,-18],
// 0 // Top faces
// 4 0 -18 -.25 16.5 18 -.25 16.5 16.5 -.25 18 -16.5 -.25 18
  [4,0,-18,-.25,16.5,18,-.25,16.5,16.5,-.25,18,-16.5,-.25,18],
// 4 0 -18 -.25 16.5 -18 -.25 -16.5 18 -.25 -16.5 18 -.25 16.5
  [4,0,-18,-.25,16.5,-18,-.25,-16.5,18,-.25,-16.5,18,-.25,16.5],
// 4 0 -18 -.25 -16.5 -16.5 -.25 -18 16.5 -.25 -18 18 -.25 -16.5
  [4,0,-18,-.25,-16.5,-16.5,-.25,-18,16.5,-.25,-18,18,-.25,-16.5],
];
module ldraw_lib__6142622d(step=0, col=false, unit=2/5, alt=false, line=0.2, solid=!$preview)
    makepoly(ldraw_lib__6142622d(solid), step=step, col=col, unit=unit, alt=alt, line=line, solid=solid);
ldraw_lib__6142622d(line=0.2);
